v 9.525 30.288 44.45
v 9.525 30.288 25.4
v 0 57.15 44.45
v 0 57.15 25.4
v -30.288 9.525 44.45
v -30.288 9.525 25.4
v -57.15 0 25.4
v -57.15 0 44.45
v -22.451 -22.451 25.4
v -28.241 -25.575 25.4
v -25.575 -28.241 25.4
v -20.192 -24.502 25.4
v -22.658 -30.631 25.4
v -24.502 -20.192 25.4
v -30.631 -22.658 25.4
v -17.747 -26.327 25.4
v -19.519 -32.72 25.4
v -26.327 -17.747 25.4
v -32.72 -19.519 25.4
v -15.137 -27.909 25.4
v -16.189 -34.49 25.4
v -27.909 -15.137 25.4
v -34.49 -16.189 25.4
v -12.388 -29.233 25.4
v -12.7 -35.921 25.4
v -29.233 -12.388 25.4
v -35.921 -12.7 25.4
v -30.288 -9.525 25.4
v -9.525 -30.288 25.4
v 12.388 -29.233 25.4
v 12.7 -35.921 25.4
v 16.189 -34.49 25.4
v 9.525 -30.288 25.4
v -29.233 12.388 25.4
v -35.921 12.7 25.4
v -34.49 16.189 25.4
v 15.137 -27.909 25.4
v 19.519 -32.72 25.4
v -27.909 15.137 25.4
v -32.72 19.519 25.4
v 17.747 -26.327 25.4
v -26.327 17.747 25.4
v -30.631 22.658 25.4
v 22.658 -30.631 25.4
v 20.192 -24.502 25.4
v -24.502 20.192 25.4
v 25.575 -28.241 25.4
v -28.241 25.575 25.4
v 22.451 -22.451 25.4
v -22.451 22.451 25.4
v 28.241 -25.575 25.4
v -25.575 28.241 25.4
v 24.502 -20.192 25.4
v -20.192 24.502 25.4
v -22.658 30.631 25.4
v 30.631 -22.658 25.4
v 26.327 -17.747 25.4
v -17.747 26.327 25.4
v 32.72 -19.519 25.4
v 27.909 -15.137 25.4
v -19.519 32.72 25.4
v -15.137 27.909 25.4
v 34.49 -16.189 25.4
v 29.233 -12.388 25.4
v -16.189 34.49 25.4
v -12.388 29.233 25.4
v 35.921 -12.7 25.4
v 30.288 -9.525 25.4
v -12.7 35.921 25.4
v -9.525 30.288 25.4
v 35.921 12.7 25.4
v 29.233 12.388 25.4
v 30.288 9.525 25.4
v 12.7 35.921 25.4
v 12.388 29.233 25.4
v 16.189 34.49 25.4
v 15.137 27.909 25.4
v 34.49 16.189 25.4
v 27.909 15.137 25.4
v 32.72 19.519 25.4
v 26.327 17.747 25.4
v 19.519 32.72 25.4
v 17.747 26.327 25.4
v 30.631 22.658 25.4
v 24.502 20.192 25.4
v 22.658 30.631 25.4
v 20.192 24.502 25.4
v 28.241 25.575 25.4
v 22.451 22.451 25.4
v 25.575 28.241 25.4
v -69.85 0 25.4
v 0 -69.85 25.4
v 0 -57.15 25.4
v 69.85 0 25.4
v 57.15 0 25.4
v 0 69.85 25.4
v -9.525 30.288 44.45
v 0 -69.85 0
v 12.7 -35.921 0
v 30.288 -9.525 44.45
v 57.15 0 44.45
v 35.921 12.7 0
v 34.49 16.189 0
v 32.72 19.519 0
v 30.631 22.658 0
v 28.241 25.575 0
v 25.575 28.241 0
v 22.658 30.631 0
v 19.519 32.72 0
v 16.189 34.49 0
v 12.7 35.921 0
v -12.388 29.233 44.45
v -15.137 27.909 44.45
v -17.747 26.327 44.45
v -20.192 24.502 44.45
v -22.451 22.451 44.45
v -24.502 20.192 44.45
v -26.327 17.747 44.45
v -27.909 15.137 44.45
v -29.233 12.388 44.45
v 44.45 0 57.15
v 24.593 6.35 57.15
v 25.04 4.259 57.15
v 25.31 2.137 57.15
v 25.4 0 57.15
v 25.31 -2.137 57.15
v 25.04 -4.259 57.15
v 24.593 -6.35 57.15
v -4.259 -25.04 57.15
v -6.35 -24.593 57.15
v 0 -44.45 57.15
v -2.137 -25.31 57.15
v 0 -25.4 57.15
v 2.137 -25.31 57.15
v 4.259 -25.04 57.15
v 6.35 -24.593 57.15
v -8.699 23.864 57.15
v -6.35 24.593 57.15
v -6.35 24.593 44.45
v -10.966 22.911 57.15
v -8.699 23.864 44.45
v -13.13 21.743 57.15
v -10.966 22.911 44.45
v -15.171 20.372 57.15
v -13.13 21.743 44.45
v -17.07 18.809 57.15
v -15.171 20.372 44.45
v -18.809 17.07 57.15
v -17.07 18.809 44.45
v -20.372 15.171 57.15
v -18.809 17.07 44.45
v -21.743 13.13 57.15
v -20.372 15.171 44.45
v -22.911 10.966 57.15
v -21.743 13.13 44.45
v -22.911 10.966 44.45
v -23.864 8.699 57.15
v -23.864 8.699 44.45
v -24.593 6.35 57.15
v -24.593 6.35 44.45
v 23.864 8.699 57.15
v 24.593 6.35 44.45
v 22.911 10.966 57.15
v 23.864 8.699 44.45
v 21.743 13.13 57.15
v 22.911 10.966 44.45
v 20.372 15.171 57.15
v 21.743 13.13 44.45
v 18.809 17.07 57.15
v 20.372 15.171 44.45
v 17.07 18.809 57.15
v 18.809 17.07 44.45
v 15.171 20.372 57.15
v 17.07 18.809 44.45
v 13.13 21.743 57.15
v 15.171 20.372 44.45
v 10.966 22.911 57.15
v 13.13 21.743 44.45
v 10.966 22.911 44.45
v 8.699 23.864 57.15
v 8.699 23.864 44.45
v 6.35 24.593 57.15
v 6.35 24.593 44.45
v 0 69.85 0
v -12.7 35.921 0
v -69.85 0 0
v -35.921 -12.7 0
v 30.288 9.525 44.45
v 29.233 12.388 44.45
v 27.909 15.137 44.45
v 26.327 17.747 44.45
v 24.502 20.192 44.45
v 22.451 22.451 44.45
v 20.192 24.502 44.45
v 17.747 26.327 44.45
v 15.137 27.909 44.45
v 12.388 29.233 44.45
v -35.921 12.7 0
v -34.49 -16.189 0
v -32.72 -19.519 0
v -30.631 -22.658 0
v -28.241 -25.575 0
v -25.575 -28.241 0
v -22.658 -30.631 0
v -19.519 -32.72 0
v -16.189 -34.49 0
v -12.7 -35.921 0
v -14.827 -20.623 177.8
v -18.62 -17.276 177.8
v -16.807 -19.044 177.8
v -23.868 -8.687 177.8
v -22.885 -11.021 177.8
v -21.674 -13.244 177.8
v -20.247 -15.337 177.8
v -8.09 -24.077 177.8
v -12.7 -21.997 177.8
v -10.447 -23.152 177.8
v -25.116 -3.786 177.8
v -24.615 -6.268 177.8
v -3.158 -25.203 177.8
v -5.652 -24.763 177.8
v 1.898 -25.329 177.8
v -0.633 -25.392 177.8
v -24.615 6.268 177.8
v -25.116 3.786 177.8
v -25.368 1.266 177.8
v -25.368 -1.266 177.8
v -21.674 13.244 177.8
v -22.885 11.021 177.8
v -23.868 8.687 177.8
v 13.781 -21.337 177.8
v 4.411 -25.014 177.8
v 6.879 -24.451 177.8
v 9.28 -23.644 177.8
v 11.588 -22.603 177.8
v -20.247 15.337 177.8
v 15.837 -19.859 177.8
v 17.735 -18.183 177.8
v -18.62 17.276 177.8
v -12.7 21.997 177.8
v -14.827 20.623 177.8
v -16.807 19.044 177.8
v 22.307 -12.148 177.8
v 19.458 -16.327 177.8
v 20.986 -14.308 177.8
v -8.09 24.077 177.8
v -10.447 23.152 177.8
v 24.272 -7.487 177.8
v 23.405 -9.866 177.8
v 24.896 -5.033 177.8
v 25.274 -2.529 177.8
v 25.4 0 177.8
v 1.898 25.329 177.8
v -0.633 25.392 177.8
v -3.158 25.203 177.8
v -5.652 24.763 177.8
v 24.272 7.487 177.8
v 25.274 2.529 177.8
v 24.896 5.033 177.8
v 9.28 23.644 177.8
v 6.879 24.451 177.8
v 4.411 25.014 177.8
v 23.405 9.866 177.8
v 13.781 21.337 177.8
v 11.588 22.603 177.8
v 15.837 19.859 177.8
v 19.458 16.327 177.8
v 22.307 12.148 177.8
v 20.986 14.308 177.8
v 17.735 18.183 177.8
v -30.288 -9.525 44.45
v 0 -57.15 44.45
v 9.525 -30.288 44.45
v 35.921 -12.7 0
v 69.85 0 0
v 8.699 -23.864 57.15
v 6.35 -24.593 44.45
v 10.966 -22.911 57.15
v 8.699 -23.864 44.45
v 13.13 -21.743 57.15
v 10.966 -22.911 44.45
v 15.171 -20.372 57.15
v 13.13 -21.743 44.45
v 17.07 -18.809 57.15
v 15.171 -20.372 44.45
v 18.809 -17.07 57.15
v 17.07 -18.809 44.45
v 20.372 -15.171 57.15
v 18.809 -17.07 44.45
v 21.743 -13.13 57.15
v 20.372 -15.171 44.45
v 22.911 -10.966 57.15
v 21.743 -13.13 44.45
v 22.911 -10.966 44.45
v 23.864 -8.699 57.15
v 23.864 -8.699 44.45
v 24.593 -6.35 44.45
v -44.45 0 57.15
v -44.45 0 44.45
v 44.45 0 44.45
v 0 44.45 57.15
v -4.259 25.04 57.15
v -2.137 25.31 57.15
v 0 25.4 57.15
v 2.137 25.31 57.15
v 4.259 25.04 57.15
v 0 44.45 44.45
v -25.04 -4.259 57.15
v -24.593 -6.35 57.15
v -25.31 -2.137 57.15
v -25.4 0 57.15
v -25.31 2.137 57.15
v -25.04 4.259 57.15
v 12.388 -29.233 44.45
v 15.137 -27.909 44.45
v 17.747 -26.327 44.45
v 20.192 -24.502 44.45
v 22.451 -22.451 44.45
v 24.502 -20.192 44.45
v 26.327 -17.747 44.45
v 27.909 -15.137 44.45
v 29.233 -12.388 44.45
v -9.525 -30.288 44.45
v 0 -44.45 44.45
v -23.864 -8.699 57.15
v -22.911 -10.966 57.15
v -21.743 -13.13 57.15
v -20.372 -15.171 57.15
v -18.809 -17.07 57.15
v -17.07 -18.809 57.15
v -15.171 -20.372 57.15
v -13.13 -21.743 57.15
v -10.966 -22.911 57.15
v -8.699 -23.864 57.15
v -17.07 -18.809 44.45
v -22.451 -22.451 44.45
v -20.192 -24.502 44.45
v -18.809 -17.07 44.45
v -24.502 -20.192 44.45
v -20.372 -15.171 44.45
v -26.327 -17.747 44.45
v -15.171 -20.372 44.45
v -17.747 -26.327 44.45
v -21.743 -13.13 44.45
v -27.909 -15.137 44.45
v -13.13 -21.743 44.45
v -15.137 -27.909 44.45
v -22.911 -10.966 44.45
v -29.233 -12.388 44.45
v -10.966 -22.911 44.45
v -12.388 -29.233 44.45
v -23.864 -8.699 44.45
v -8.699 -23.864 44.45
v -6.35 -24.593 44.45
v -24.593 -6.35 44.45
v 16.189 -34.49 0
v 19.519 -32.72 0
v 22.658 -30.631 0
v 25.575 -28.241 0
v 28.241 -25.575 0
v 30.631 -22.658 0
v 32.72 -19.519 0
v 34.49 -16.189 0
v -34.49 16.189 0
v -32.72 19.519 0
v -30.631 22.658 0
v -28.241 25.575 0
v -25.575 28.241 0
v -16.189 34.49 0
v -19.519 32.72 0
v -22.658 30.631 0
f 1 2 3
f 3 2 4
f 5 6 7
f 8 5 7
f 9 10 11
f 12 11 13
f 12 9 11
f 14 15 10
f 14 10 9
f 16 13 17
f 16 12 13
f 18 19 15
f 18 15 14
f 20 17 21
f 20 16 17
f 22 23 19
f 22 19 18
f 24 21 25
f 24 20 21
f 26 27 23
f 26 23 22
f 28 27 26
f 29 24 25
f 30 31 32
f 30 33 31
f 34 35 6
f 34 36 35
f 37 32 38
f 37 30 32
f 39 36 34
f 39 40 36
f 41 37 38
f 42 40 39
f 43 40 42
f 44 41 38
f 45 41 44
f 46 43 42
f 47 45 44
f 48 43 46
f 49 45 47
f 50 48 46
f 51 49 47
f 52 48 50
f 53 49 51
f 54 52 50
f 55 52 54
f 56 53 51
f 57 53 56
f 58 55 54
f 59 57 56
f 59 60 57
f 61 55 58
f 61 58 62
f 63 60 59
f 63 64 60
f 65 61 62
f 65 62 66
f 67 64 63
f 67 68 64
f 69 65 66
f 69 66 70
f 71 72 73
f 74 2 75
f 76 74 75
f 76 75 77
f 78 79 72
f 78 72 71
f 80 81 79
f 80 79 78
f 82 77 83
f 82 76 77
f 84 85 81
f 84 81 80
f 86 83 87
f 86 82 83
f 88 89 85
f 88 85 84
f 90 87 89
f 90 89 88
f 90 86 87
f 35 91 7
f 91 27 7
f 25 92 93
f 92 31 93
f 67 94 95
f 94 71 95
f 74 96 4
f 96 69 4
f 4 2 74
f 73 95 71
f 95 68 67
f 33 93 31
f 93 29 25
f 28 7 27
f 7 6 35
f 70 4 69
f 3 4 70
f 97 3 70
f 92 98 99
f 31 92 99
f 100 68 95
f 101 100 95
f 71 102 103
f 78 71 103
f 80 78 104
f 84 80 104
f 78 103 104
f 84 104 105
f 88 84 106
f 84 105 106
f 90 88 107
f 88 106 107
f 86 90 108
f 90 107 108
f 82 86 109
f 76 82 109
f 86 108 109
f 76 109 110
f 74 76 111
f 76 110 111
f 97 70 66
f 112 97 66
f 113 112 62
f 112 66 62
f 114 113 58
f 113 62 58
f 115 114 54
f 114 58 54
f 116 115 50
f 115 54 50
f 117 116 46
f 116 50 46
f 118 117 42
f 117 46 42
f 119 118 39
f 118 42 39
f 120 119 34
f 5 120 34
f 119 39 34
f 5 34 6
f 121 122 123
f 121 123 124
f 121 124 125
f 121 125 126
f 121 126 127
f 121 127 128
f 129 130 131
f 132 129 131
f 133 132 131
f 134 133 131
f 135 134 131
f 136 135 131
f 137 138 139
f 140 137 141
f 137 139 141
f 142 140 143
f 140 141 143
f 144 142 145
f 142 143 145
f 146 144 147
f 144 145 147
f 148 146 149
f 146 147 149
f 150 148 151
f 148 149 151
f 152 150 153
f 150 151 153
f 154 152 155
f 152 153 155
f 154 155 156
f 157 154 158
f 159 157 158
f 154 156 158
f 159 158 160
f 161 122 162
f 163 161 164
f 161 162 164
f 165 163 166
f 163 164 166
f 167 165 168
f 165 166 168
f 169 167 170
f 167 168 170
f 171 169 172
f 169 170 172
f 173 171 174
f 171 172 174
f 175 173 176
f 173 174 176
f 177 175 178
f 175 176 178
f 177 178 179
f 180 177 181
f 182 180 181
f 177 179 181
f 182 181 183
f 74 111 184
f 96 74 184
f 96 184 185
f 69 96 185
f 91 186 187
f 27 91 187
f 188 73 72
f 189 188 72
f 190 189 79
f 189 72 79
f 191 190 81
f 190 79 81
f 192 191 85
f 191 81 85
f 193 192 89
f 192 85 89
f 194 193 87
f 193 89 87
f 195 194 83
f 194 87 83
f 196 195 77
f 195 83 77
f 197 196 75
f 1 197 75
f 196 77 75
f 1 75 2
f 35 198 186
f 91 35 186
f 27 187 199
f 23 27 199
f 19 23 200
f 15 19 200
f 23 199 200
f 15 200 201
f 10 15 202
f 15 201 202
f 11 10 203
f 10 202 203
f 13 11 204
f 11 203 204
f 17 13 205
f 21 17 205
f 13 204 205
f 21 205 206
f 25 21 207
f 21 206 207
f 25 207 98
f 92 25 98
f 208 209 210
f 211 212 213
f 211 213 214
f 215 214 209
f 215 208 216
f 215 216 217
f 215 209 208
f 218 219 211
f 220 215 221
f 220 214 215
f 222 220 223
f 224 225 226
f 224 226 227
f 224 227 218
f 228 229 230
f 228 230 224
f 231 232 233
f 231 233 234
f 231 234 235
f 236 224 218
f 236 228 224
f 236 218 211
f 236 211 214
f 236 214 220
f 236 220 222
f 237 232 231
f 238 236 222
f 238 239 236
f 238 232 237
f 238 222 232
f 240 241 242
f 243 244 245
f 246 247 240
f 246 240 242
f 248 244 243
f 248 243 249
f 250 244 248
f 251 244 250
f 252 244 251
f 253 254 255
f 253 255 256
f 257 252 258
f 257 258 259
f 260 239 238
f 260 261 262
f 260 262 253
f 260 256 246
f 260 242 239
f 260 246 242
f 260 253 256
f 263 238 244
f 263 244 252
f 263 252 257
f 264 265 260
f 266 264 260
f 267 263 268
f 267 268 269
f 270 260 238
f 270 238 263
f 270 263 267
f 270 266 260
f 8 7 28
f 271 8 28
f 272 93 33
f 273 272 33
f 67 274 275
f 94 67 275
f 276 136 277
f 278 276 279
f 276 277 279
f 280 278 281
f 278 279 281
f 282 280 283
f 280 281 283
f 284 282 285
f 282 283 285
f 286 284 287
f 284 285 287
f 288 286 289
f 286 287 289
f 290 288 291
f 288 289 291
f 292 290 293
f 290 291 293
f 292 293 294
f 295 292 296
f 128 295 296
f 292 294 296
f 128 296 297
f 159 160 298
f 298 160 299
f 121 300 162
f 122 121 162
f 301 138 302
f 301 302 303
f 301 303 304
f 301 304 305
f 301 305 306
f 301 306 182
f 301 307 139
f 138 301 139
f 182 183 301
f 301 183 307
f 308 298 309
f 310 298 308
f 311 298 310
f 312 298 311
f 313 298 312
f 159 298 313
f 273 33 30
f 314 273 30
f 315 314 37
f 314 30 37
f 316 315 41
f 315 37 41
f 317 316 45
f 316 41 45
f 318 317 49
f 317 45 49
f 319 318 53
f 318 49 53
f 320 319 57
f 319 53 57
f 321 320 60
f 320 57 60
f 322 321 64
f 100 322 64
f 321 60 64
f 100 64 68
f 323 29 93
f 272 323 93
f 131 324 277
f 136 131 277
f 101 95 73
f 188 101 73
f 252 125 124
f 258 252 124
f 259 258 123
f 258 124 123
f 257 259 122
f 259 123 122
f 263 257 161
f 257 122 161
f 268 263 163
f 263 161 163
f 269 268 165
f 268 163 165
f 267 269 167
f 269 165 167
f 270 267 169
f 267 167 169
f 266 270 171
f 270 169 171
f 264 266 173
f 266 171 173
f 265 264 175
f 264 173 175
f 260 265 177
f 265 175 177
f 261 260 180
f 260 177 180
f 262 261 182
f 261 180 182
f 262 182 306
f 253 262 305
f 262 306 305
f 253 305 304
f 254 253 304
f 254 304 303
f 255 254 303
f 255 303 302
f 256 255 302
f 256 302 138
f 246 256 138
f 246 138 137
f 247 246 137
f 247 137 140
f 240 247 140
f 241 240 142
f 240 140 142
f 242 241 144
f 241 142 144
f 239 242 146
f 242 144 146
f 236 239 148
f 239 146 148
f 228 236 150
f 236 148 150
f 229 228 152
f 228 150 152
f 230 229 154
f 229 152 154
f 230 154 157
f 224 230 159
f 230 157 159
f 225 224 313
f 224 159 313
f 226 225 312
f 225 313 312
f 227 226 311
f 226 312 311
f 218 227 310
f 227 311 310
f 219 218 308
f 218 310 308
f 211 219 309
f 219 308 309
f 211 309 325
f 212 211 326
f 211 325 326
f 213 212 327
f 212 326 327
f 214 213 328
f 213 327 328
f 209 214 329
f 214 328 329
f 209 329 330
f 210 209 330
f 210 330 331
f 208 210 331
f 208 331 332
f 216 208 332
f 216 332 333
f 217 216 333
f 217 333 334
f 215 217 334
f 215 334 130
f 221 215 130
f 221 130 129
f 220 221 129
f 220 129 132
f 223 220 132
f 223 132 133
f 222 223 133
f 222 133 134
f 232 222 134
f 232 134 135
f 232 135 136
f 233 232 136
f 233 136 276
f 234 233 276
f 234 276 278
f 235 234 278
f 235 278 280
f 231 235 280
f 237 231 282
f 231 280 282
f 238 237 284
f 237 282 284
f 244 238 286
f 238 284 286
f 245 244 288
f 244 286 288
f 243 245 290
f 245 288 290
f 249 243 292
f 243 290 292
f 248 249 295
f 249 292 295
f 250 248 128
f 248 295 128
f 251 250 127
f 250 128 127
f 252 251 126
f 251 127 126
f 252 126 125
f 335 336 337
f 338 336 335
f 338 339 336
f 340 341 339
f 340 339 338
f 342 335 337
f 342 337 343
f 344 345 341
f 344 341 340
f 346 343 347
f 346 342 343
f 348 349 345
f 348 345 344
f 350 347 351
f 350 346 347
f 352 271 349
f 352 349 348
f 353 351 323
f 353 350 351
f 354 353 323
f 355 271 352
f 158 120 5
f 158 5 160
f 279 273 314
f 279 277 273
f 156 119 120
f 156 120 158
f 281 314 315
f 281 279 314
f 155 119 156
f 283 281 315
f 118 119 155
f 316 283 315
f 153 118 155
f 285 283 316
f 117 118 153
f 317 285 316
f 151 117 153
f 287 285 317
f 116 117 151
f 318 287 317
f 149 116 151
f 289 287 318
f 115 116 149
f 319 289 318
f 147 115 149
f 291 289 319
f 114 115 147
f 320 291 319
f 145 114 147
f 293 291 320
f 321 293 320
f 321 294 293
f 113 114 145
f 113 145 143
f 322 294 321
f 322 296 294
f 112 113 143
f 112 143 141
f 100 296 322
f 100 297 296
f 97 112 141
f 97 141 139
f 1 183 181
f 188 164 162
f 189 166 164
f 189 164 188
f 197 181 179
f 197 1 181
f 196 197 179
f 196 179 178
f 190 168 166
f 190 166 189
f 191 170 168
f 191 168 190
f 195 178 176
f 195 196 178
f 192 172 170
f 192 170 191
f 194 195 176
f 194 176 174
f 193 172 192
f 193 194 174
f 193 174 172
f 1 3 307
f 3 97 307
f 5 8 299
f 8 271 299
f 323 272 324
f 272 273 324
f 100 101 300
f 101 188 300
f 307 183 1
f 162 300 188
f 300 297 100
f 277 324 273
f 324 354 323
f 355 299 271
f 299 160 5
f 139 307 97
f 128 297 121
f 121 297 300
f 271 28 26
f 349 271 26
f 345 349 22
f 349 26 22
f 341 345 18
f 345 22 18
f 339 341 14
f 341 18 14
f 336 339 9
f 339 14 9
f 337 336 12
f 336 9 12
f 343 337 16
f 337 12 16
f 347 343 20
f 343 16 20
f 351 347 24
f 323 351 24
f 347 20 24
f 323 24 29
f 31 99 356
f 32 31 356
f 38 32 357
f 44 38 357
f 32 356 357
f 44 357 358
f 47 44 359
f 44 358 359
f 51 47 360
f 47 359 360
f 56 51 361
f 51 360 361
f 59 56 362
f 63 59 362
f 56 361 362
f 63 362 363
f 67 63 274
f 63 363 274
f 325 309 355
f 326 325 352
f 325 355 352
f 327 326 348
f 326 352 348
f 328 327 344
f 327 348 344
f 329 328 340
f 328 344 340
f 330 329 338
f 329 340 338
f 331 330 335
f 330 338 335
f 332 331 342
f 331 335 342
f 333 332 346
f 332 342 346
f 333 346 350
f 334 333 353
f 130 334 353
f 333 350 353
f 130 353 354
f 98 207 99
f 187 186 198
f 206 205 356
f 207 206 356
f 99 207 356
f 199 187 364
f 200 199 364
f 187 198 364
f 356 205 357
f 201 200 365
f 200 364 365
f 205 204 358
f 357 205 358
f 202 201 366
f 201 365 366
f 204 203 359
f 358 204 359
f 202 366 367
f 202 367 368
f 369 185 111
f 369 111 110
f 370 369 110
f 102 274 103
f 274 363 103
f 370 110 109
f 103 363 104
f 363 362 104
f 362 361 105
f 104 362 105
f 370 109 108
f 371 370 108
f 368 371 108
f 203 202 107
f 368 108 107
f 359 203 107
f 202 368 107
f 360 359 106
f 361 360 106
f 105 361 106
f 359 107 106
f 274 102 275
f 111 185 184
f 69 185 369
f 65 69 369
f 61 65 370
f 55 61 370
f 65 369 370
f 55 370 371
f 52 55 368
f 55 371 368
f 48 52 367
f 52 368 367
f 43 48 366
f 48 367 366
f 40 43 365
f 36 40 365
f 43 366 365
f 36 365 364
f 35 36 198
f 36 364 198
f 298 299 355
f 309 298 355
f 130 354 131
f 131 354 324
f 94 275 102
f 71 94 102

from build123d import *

# Parameters (mm, degrees)
F1_DEPTH = 25.4
F3_DEPTH = 44.45
F5_DEPTH = 57.15
F6_R     = 25.4
F7_DEPTH = 177.8


with BuildPart() as f1:
    # F0 (on Top) → F1 (new body)
    with BuildSketch(Plane.XY):
        with BuildLine():
            ThreePointArc((-38.1, 0), (-37.551305, 6.442785), (-35.921024, 12.7))
            Line((-35.921024, 12.7), (-69.85, 0))
            Line((-69.85, 0), (-38.1, 0))
        make_face()
        with BuildLine():
            Line((-69.85, 0), (-35.921024, -12.7))
            ThreePointArc((-35.921024, -12.7), (-37.551305, -6.442785), (-38.1, 0))
            Line((-38.1, 0), (-69.85, 0))
        make_face()
        with BuildLine():
            ThreePointArc((35.921024, 12.7), (37.551305, 6.442785), (38.1, 0))
            ThreePointArc((38.1, 0), (37.551305, -6.442785), (35.921024, -12.7))
            Line((35.921024, -12.7), (69.85, 0))
            Line((69.85, 0), (35.921024, 12.7))
        make_face()
        with BuildLine():
            ThreePointArc((0, 38.1), (6.442785, 37.551305), (12.7, 35.921024))
            Line((12.7, 35.921024), (0, 69.85))
            Line((0, 69.85), (0, 38.1))
        make_face()
        with BuildLine():
            ThreePointArc((-12.7, 35.921024), (-6.442785, 37.551305), (0, 38.1))
            Line((0, 38.1), (0, 69.85))
            Line((0, 69.85), (-12.7, 35.921024))
        make_face()
        with BuildLine():
            ThreePointArc((35.921024, -12.7), (37.551305, -6.442785), (38.1, 0))
            ThreePointArc((38.1, 0), (37.551305, 6.442785), (35.921024, 12.7))
            ThreePointArc((35.921024, 12.7), (26.940768, 26.940768), (12.7, 35.921024))
            ThreePointArc((12.7, 35.921024), (6.442785, 37.551305), (0, 38.1))
            ThreePointArc((0, 38.1), (-6.442785, 37.551305), (-12.7, 35.921024))
            ThreePointArc((-12.7, 35.921024), (-26.940768, 26.940768), (-35.921024, 12.7))
            ThreePointArc((-35.921024, 12.7), (-37.551305, 6.442785), (-38.1, 0))
            ThreePointArc((-38.1, 0), (-37.551305, -6.442785), (-35.921024, -12.7))
            ThreePointArc((-35.921024, -12.7), (-26.940768, -26.940768), (-12.7, -35.921024))
            ThreePointArc((-12.7, -35.921024), (0, -38.1), (12.7, -35.921024))
            ThreePointArc((12.7, -35.921024), (26.940768, -26.940768), (35.921024, -12.7))
        make_face()
        with BuildLine():
            Line((0, -69.85), (12.7, -35.921024))
            ThreePointArc((12.7, -35.921024), (0, -38.1), (-12.7, -35.921024))
            Line((-12.7, -35.921024), (0, -69.85))
        make_face()
    extrude(amount=F1_DEPTH)

    # F2 (on Top) → F3 (join)
    with BuildSketch(Plane.XY):
        with BuildLine():
            ThreePointArc((30.28757, -9.525), (31.382263, -4.818307), (31.75, 0))
            ThreePointArc((31.75, 0), (31.382263, 4.818307), (30.28757, 9.525))
            ThreePointArc((30.28757, 9.525), (22.45064, 22.45064), (9.525, 30.28757))
            ThreePointArc((9.525, 30.28757), (0, 31.75), (-9.525, 30.28757))
            ThreePointArc((-9.525, 30.28757), (-22.45064, 22.45064), (-30.28757, 9.525))
            ThreePointArc((-30.28757, 9.525), (-31.382263, 4.818307), (-31.75, 0))
            ThreePointArc((-31.75, 0), (-31.382263, -4.818307), (-30.28757, -9.525))
            ThreePointArc((-30.28757, -9.525), (-22.45064, -22.45064), (-9.525, -30.28757))
            ThreePointArc((-9.525, -30.28757), (-4.818307, -31.382263), (0, -31.75))
            ThreePointArc((0, -31.75), (4.818307, -31.382263), (9.525, -30.28757))
            ThreePointArc((9.525, -30.28757), (22.45064, -22.45064), (30.28757, -9.525))
        make_face()
        with BuildLine():
            ThreePointArc((30.28757, 9.525), (31.382263, 4.818307), (31.75, 0))
            ThreePointArc((31.75, 0), (31.382263, -4.818307), (30.28757, -9.525))
            Line((30.28757, -9.525), (57.15, 0))
            Line((57.15, 0), (30.28757, 9.525))
        make_face()
        with BuildLine():
            ThreePointArc((-9.525, 30.28757), (0, 31.75), (9.525, 30.28757))
            Line((9.525, 30.28757), (0, 57.15))
            Line((0, 57.15), (-9.525, 30.28757))
        make_face()
        with BuildLine():
            Line((0, -57.15), (9.525, -30.28757))
            ThreePointArc((9.525, -30.28757), (4.818307, -31.382263), (0, -31.75))
            Line((0, -31.75), (0, -57.15))
        make_face()
        with BuildLine():
            Line((0, -57.15), (0, -31.75))
            ThreePointArc((0, -31.75), (-4.818307, -31.382263), (-9.525, -30.28757))
            Line((-9.525, -30.28757), (0, -57.15))
        make_face()
        with BuildLine():
            ThreePointArc((-31.75, 0), (-31.382263, 4.818307), (-30.28757, 9.525))
            Line((-30.28757, 9.525), (-57.15, 0))
            Line((-57.15, 0), (-31.75, 0))
        make_face()
        with BuildLine():
            ThreePointArc((-30.28757, -9.525), (-31.382263, -4.818307), (-31.75, 0))
            Line((-31.75, 0), (-57.15, 0))
            Line((-57.15, 0), (-30.28757, -9.525))
        make_face()
    extrude(amount=F3_DEPTH)

    # F4 (on Top) → F5 (join)
    with BuildSketch(Plane.XY):
        with BuildLine():
            ThreePointArc((24.593444, -6.35), (25.197554, -3.200509), (25.4, 0))
            ThreePointArc((25.4, 0), (25.197554, 3.200509), (24.593444, 6.35))
            ThreePointArc((24.593444, 6.35), (17.960512, 17.960512), (6.35, 24.593444))
            ThreePointArc((6.35, 24.593444), (3.200509, 25.197554), (0, 25.4))
            ThreePointArc((0, 25.4), (-3.200509, 25.197554), (-6.35, 24.593444))
            ThreePointArc((-6.35, 24.593444), (-17.960512, 17.960512), (-24.593444, 6.35))
            ThreePointArc((-24.593444, 6.35), (-25.197554, 3.200509), (-25.4, 0))
            ThreePointArc((-25.4, 0), (-25.197554, -3.200509), (-24.593444, -6.35))
            ThreePointArc((-24.593444, -6.35), (-17.960512, -17.960512), (-6.35, -24.593444))
            ThreePointArc((-6.35, -24.593444), (0, -25.4), (6.35, -24.593444))
            ThreePointArc((6.35, -24.593444), (17.960512, -17.960512), (24.593444, -6.35))
        make_face()
        with BuildLine():
            ThreePointArc((24.593444, 6.35), (25.197554, 3.200509), (25.4, 0))
            ThreePointArc((25.4, 0), (25.197554, -3.200509), (24.593444, -6.35))
            Line((24.593444, -6.35), (44.45, 0))
            Line((44.45, 0), (24.593444, 6.35))
        make_face()
        with BuildLine():
            ThreePointArc((0, 25.4), (3.200509, 25.197554), (6.35, 24.593444))
            Line((6.35, 24.593444), (0, 44.45))
            Line((0, 44.45), (0, 25.4))
        make_face()
        with BuildLine():
            Line((0, -44.45), (6.35, -24.593444))
            ThreePointArc((6.35, -24.593444), (0, -25.4), (-6.35, -24.593444))
            Line((-6.35, -24.593444), (0, -44.45))
        make_face()
        with BuildLine():
            ThreePointArc((-6.35, 24.593444), (-3.200509, 25.197554), (0, 25.4))
            Line((0, 25.4), (0, 44.45))
            Line((0, 44.45), (-6.35, 24.593444))
        make_face()
        with BuildLine():
            Line((-44.45, 0), (-24.593444, -6.35))
            ThreePointArc((-24.593444, -6.35), (-25.197554, -3.200509), (-25.4, 0))
            Line((-25.4, 0), (-44.45, 0))
        make_face()
        with BuildLine():
            ThreePointArc((-25.4, 0), (-25.197554, 3.200509), (-24.593444, 6.35))
            Line((-24.593444, 6.35), (-44.45, 0))
            Line((-44.45, 0), (-25.4, 0))
        make_face()
    extrude(amount=F5_DEPTH)

    # F6 (on Top) → F7 (join)
    with BuildSketch(Plane.XY):
        Circle(F6_R)
    extrude(amount=F7_DEPTH)


solid = f1.part
